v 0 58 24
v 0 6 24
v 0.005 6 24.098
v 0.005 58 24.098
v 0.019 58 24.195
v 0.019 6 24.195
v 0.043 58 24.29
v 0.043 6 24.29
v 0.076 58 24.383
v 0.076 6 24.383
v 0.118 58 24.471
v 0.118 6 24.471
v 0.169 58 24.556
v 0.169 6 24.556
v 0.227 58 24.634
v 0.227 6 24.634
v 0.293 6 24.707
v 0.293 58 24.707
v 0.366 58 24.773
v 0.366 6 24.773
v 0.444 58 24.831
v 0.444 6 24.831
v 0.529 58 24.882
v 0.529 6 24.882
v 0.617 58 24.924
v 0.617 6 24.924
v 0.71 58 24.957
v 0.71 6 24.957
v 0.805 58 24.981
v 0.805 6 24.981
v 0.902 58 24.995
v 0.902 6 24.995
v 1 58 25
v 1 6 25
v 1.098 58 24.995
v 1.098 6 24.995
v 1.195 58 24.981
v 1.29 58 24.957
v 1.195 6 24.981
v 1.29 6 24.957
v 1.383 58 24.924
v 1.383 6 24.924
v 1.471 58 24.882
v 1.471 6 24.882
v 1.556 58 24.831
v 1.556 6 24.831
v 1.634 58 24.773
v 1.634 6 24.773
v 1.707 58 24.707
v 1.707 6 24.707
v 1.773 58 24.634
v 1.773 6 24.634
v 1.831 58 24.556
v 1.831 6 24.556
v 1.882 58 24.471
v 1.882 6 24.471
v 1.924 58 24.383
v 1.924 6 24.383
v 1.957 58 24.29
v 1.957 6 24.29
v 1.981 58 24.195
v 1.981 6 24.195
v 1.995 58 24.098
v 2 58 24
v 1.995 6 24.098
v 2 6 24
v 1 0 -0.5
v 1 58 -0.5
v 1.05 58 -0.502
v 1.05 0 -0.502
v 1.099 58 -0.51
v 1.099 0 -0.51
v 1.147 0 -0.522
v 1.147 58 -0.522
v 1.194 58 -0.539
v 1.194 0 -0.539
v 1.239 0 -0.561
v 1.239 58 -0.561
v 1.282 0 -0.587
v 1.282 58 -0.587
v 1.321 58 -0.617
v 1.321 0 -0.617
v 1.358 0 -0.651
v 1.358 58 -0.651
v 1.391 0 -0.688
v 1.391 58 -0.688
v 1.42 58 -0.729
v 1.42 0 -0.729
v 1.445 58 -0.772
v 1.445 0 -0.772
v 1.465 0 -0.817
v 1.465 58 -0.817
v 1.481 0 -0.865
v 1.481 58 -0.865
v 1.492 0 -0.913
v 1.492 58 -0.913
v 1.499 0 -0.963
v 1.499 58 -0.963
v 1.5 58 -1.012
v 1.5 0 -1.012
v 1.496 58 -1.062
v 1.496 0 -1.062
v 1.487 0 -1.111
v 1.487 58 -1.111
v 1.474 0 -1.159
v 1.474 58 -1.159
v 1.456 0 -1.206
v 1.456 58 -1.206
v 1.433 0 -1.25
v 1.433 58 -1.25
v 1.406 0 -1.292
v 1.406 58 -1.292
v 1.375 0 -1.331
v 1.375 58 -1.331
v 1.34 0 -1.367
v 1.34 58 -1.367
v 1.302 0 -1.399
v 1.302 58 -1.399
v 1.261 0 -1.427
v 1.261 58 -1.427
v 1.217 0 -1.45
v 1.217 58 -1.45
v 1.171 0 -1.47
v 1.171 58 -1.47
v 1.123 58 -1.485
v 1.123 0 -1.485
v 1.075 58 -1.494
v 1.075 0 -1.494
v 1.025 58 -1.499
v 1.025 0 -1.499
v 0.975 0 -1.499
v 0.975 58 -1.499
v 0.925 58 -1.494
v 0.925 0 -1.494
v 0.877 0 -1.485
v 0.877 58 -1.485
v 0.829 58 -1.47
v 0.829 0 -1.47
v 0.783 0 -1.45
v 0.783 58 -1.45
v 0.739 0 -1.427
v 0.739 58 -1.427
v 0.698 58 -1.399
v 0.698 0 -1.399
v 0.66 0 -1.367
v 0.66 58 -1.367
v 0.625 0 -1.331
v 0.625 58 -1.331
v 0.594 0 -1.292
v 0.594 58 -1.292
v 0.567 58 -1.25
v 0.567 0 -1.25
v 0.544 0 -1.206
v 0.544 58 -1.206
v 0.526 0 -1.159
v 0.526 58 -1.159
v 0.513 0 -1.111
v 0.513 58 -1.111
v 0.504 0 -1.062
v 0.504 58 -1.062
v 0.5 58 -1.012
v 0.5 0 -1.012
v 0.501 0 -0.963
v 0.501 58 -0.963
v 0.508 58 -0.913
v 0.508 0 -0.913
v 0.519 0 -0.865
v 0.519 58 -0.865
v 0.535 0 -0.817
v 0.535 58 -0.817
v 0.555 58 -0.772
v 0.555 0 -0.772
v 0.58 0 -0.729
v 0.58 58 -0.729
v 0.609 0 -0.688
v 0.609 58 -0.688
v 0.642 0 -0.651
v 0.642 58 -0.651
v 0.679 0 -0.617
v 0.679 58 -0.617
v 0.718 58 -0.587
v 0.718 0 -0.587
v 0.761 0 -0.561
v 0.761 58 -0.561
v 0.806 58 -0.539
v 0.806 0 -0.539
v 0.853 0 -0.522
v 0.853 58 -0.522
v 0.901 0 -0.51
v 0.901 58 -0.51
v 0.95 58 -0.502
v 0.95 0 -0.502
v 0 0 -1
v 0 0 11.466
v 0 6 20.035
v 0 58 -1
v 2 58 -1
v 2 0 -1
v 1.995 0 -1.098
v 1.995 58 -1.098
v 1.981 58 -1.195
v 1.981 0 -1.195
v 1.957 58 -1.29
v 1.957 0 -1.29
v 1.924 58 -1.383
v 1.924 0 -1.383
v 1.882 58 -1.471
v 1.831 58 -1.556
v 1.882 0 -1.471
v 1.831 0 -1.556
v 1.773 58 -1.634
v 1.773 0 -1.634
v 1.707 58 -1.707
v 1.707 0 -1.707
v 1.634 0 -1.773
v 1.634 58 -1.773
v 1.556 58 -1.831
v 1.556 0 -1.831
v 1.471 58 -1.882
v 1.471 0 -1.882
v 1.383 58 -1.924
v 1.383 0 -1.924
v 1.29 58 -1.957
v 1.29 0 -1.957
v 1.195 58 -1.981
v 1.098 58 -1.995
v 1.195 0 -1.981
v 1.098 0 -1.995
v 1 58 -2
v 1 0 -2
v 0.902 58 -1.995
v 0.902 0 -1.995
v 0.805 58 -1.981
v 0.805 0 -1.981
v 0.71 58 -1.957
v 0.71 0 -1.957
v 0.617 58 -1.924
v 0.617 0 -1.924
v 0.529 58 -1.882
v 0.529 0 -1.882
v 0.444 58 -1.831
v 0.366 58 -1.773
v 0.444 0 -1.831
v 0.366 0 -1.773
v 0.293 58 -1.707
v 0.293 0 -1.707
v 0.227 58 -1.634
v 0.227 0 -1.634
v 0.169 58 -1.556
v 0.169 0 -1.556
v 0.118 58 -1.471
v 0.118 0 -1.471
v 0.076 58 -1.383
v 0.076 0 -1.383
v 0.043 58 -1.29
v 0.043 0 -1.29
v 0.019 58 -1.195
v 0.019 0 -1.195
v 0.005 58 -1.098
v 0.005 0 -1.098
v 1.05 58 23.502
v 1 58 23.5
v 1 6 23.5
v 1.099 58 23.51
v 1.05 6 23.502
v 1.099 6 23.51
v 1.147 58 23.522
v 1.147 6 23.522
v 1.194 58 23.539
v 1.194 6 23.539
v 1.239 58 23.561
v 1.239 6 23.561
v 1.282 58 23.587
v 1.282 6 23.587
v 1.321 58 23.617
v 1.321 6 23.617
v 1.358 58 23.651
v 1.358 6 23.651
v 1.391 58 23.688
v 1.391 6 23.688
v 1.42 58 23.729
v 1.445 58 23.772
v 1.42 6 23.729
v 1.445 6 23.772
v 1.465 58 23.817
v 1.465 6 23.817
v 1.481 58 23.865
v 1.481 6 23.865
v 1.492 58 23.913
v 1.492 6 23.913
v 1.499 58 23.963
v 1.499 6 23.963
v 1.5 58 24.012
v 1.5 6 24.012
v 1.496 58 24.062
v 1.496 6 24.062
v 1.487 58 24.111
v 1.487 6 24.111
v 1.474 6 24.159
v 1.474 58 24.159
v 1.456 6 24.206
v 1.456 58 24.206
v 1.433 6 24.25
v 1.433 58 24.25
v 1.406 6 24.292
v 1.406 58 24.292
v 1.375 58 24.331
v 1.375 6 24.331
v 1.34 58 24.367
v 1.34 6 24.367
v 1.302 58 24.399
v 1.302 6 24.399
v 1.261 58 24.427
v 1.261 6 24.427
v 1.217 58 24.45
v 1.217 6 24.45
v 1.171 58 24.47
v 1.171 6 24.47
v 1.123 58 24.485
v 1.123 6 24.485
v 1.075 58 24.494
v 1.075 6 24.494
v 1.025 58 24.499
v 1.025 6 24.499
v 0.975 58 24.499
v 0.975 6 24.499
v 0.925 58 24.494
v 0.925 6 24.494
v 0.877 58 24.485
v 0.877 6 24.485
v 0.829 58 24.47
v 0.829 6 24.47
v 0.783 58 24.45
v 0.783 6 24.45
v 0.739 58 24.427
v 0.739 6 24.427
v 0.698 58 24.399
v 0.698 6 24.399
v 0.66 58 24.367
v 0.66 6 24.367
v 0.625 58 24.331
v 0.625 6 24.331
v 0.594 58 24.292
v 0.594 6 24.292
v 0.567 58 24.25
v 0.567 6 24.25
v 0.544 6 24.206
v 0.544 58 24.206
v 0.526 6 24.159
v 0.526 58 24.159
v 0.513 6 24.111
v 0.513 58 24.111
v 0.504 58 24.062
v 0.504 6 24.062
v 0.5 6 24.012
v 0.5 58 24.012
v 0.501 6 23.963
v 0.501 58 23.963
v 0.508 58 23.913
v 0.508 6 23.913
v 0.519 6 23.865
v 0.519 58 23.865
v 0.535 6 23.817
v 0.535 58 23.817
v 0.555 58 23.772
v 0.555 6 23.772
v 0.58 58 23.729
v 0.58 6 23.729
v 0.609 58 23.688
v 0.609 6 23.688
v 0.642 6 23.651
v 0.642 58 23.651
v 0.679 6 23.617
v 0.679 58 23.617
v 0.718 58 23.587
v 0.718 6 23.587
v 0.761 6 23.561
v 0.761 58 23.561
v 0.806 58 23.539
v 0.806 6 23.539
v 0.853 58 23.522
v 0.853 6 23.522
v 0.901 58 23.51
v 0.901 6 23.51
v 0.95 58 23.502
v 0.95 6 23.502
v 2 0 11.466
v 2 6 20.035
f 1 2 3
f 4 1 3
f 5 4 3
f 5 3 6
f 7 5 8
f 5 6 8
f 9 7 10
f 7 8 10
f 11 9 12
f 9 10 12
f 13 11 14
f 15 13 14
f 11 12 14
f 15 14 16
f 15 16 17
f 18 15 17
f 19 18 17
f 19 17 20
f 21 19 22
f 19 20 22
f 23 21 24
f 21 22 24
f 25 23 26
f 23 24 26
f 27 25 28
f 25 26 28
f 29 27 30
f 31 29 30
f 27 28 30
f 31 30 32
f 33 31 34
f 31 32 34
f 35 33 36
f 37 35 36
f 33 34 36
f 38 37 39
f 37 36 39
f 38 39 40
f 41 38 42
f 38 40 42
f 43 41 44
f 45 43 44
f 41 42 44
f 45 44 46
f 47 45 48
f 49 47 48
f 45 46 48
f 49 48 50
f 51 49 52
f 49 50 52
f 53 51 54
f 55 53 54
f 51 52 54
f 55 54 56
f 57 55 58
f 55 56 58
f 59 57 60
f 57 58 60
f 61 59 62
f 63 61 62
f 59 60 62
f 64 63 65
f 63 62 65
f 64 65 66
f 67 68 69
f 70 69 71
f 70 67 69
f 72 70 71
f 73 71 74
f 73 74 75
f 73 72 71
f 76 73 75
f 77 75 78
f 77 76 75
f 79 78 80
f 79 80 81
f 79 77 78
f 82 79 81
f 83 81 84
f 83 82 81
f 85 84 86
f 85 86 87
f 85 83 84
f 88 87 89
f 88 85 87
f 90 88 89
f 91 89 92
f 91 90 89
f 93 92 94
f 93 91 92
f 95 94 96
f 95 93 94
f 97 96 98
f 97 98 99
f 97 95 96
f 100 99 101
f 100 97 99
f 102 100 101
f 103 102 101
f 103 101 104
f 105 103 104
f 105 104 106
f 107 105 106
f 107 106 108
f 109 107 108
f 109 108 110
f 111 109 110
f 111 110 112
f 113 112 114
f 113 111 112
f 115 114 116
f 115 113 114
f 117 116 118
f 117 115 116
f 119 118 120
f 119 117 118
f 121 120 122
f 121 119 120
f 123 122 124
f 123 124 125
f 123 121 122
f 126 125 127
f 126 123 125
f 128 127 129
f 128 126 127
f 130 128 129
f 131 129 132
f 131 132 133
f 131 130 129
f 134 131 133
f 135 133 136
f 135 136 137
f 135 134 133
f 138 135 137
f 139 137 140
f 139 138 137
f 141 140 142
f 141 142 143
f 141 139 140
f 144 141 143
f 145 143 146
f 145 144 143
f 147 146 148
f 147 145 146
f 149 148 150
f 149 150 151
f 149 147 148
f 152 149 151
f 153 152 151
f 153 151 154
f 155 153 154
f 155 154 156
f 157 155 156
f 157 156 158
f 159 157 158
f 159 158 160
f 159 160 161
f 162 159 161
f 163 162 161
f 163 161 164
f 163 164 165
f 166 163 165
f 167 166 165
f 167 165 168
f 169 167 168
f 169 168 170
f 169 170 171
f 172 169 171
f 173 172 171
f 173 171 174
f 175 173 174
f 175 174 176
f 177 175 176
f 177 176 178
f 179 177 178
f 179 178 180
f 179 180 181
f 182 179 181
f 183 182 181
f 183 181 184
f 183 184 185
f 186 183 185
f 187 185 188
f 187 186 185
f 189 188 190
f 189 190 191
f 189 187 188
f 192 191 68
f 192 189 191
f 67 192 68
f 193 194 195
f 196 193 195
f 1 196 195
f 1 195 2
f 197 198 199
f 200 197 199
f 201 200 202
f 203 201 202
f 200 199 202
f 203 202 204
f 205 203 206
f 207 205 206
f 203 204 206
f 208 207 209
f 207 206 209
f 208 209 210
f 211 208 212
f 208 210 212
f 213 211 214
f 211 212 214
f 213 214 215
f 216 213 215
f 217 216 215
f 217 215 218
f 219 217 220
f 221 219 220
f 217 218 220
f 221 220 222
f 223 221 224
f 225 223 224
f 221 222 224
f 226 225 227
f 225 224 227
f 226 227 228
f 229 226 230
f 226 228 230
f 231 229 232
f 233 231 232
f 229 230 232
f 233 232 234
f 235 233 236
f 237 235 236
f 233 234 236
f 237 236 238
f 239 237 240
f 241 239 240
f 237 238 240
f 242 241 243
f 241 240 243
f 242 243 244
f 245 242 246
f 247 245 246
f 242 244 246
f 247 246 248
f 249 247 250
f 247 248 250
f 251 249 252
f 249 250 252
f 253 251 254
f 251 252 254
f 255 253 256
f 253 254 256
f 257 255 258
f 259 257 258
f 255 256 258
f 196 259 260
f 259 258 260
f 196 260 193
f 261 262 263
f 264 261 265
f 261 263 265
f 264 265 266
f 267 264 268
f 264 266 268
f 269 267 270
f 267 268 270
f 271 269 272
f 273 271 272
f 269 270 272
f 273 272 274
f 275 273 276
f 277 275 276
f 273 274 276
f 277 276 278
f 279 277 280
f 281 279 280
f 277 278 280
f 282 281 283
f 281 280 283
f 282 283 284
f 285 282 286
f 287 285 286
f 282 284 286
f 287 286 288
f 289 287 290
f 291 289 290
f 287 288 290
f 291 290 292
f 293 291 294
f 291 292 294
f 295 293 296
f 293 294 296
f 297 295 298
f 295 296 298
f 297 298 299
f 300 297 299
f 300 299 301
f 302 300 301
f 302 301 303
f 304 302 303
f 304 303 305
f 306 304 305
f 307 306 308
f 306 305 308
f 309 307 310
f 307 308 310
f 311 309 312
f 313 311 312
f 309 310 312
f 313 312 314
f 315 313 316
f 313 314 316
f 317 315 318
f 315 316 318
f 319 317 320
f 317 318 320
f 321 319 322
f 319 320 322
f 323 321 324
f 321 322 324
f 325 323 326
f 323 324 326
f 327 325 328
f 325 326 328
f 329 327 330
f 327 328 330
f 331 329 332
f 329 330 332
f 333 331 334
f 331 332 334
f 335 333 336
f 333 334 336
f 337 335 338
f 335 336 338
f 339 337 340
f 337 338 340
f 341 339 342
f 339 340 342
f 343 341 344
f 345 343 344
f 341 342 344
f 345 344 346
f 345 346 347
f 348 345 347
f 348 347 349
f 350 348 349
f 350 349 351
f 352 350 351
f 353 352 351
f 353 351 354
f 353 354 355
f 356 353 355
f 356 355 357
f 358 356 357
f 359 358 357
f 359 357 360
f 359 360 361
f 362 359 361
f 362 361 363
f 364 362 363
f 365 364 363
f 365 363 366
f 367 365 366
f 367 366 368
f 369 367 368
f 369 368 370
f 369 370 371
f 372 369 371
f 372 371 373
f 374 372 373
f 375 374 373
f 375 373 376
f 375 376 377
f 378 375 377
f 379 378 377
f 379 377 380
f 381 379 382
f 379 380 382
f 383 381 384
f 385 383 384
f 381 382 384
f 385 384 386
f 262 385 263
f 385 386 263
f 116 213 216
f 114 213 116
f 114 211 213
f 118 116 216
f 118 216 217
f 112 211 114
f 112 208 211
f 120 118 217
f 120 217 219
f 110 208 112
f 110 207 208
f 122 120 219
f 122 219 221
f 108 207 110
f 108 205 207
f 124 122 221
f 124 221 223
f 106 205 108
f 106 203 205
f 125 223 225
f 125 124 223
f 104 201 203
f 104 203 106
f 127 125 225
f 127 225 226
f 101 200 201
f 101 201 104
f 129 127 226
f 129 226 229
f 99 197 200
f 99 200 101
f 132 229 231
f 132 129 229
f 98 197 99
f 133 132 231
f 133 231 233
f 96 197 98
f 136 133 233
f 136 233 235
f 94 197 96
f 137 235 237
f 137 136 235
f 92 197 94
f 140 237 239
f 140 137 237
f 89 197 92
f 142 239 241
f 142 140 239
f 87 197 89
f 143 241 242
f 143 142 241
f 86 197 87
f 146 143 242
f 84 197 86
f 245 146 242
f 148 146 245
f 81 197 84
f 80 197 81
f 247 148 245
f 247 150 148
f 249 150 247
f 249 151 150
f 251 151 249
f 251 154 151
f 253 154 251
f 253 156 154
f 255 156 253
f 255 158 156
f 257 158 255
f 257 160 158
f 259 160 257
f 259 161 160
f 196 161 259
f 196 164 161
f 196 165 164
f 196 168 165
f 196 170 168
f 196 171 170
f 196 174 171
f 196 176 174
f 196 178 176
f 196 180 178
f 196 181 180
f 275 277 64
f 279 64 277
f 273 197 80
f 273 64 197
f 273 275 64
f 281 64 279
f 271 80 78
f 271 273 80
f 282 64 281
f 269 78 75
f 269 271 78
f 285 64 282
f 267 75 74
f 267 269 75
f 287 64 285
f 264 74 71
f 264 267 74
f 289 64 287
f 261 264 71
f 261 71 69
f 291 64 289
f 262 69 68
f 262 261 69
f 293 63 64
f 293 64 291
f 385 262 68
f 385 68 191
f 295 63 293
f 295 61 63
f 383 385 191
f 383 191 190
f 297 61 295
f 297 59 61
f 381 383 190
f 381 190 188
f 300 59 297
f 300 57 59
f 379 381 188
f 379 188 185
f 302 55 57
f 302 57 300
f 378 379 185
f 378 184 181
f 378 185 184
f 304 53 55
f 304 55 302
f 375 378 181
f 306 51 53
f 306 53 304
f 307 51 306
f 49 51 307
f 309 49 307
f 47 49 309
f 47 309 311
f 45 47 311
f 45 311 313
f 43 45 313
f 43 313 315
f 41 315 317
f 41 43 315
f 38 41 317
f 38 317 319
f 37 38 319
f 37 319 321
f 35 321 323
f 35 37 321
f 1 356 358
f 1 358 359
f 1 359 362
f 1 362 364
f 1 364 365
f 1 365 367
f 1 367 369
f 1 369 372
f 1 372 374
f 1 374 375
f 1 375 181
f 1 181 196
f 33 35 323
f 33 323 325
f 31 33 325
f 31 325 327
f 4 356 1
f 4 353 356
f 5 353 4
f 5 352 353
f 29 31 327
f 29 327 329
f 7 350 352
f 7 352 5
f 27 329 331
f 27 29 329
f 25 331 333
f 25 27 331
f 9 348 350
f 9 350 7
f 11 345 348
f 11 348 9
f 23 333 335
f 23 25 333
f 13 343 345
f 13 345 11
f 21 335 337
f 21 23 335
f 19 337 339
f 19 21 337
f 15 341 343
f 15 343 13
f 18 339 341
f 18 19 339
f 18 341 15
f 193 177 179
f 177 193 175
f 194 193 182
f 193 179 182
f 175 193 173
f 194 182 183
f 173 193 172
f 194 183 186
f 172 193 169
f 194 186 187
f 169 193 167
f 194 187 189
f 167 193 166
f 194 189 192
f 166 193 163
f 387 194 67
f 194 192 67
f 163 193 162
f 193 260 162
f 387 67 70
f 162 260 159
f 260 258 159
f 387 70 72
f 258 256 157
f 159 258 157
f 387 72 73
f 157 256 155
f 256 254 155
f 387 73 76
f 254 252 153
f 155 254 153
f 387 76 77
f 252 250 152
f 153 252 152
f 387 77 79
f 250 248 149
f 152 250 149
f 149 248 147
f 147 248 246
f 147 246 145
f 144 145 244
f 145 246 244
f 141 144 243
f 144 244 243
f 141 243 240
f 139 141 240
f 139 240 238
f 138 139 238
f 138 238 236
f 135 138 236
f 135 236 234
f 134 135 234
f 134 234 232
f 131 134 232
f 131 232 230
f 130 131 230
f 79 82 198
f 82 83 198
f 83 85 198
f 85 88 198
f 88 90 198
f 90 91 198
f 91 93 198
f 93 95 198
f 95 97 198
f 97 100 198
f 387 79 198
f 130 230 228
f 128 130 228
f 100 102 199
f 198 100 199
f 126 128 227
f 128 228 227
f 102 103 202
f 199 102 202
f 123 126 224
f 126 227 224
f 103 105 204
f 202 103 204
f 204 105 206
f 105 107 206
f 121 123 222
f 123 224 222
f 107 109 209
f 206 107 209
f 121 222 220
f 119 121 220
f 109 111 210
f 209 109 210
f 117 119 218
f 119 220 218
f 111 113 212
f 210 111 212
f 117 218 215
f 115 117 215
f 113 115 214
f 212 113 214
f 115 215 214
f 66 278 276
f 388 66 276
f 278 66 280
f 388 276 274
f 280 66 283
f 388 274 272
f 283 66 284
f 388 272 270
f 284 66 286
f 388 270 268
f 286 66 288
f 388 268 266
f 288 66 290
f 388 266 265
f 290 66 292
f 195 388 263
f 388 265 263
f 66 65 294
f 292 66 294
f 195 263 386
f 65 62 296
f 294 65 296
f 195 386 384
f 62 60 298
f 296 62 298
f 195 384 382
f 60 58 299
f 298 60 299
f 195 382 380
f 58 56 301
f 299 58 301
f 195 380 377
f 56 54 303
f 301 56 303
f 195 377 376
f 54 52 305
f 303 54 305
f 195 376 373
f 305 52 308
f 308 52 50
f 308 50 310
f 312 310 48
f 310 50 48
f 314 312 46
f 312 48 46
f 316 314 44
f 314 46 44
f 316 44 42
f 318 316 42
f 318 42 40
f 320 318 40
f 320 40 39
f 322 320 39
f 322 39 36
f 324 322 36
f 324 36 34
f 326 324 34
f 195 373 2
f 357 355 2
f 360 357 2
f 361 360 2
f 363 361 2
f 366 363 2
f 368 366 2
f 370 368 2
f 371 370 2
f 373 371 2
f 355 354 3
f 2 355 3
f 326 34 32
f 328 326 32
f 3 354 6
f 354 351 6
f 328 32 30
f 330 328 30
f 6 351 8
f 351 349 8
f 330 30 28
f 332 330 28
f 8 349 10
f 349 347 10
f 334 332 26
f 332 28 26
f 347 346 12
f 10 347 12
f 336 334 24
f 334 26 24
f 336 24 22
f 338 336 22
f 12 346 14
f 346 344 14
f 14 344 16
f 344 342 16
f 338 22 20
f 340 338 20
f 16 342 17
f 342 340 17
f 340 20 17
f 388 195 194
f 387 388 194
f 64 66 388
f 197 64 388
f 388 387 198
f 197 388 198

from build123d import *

# Parameters (mm, degrees)
EXTRUDE_1_DEPTH = 2
SKETCH_2_R      = 0.5
EXTRUDE_2_DEPTH = 58
SKETCH_3_R      = 0.5
EXTRUDE_3_DEPTH = 52


with BuildPart() as part:
    # Эскиз1 → Бобышка-Вытянуть1 (new body)
    with BuildSketch(Plane(origin=(0, 0, 0), x_dir=(0, 0, -1), z_dir=(1, 0, 0))):
        Polygon((-23, 6), (-20.034972426, 6), (-11.466084386, 0), (0, 0), (0, 58), (-23, 58), align=None)
    extrude(amount=EXTRUDE_1_DEPTH)

    # Эскиз2 → Бобышка-Вытянуть2 (add)
    with BuildSketch(Plane(origin=(0, 0, 0), x_dir=(1, 0, 0), z_dir=(0, 1, 0))):
        with BuildLine():
            Line((0, 1), (0, 0))
            Line((0, 0), (2, 0))
            Line((2, 0), (2, 1))
            ThreePointArc((2, 1), (1, 2), (0, 1))
        make_face()
        with Locations(Location((1, 1, 0), (0, 0, 270))):
            Circle(SKETCH_2_R, mode=Mode.SUBTRACT)
    extrude(amount=EXTRUDE_2_DEPTH)

    # Эскиз3 → Бобышка-Вытянуть3 (add)
    with BuildSketch(Plane.XZ.offset(-6)):
        with BuildLine():
            Line((0, 23), (0, 24))
            ThreePointArc((0, 24), (1, 25), (2, 24))
            Line((2, 24), (2, 23))
            Line((2, 23), (0, 23))
        make_face()
        with Locations(Location((1, 24, 0), (0, 0, 270))):
            Circle(SKETCH_3_R, mode=Mode.SUBTRACT)
    extrude(amount=-EXTRUDE_3_DEPTH)


solid = part.part
